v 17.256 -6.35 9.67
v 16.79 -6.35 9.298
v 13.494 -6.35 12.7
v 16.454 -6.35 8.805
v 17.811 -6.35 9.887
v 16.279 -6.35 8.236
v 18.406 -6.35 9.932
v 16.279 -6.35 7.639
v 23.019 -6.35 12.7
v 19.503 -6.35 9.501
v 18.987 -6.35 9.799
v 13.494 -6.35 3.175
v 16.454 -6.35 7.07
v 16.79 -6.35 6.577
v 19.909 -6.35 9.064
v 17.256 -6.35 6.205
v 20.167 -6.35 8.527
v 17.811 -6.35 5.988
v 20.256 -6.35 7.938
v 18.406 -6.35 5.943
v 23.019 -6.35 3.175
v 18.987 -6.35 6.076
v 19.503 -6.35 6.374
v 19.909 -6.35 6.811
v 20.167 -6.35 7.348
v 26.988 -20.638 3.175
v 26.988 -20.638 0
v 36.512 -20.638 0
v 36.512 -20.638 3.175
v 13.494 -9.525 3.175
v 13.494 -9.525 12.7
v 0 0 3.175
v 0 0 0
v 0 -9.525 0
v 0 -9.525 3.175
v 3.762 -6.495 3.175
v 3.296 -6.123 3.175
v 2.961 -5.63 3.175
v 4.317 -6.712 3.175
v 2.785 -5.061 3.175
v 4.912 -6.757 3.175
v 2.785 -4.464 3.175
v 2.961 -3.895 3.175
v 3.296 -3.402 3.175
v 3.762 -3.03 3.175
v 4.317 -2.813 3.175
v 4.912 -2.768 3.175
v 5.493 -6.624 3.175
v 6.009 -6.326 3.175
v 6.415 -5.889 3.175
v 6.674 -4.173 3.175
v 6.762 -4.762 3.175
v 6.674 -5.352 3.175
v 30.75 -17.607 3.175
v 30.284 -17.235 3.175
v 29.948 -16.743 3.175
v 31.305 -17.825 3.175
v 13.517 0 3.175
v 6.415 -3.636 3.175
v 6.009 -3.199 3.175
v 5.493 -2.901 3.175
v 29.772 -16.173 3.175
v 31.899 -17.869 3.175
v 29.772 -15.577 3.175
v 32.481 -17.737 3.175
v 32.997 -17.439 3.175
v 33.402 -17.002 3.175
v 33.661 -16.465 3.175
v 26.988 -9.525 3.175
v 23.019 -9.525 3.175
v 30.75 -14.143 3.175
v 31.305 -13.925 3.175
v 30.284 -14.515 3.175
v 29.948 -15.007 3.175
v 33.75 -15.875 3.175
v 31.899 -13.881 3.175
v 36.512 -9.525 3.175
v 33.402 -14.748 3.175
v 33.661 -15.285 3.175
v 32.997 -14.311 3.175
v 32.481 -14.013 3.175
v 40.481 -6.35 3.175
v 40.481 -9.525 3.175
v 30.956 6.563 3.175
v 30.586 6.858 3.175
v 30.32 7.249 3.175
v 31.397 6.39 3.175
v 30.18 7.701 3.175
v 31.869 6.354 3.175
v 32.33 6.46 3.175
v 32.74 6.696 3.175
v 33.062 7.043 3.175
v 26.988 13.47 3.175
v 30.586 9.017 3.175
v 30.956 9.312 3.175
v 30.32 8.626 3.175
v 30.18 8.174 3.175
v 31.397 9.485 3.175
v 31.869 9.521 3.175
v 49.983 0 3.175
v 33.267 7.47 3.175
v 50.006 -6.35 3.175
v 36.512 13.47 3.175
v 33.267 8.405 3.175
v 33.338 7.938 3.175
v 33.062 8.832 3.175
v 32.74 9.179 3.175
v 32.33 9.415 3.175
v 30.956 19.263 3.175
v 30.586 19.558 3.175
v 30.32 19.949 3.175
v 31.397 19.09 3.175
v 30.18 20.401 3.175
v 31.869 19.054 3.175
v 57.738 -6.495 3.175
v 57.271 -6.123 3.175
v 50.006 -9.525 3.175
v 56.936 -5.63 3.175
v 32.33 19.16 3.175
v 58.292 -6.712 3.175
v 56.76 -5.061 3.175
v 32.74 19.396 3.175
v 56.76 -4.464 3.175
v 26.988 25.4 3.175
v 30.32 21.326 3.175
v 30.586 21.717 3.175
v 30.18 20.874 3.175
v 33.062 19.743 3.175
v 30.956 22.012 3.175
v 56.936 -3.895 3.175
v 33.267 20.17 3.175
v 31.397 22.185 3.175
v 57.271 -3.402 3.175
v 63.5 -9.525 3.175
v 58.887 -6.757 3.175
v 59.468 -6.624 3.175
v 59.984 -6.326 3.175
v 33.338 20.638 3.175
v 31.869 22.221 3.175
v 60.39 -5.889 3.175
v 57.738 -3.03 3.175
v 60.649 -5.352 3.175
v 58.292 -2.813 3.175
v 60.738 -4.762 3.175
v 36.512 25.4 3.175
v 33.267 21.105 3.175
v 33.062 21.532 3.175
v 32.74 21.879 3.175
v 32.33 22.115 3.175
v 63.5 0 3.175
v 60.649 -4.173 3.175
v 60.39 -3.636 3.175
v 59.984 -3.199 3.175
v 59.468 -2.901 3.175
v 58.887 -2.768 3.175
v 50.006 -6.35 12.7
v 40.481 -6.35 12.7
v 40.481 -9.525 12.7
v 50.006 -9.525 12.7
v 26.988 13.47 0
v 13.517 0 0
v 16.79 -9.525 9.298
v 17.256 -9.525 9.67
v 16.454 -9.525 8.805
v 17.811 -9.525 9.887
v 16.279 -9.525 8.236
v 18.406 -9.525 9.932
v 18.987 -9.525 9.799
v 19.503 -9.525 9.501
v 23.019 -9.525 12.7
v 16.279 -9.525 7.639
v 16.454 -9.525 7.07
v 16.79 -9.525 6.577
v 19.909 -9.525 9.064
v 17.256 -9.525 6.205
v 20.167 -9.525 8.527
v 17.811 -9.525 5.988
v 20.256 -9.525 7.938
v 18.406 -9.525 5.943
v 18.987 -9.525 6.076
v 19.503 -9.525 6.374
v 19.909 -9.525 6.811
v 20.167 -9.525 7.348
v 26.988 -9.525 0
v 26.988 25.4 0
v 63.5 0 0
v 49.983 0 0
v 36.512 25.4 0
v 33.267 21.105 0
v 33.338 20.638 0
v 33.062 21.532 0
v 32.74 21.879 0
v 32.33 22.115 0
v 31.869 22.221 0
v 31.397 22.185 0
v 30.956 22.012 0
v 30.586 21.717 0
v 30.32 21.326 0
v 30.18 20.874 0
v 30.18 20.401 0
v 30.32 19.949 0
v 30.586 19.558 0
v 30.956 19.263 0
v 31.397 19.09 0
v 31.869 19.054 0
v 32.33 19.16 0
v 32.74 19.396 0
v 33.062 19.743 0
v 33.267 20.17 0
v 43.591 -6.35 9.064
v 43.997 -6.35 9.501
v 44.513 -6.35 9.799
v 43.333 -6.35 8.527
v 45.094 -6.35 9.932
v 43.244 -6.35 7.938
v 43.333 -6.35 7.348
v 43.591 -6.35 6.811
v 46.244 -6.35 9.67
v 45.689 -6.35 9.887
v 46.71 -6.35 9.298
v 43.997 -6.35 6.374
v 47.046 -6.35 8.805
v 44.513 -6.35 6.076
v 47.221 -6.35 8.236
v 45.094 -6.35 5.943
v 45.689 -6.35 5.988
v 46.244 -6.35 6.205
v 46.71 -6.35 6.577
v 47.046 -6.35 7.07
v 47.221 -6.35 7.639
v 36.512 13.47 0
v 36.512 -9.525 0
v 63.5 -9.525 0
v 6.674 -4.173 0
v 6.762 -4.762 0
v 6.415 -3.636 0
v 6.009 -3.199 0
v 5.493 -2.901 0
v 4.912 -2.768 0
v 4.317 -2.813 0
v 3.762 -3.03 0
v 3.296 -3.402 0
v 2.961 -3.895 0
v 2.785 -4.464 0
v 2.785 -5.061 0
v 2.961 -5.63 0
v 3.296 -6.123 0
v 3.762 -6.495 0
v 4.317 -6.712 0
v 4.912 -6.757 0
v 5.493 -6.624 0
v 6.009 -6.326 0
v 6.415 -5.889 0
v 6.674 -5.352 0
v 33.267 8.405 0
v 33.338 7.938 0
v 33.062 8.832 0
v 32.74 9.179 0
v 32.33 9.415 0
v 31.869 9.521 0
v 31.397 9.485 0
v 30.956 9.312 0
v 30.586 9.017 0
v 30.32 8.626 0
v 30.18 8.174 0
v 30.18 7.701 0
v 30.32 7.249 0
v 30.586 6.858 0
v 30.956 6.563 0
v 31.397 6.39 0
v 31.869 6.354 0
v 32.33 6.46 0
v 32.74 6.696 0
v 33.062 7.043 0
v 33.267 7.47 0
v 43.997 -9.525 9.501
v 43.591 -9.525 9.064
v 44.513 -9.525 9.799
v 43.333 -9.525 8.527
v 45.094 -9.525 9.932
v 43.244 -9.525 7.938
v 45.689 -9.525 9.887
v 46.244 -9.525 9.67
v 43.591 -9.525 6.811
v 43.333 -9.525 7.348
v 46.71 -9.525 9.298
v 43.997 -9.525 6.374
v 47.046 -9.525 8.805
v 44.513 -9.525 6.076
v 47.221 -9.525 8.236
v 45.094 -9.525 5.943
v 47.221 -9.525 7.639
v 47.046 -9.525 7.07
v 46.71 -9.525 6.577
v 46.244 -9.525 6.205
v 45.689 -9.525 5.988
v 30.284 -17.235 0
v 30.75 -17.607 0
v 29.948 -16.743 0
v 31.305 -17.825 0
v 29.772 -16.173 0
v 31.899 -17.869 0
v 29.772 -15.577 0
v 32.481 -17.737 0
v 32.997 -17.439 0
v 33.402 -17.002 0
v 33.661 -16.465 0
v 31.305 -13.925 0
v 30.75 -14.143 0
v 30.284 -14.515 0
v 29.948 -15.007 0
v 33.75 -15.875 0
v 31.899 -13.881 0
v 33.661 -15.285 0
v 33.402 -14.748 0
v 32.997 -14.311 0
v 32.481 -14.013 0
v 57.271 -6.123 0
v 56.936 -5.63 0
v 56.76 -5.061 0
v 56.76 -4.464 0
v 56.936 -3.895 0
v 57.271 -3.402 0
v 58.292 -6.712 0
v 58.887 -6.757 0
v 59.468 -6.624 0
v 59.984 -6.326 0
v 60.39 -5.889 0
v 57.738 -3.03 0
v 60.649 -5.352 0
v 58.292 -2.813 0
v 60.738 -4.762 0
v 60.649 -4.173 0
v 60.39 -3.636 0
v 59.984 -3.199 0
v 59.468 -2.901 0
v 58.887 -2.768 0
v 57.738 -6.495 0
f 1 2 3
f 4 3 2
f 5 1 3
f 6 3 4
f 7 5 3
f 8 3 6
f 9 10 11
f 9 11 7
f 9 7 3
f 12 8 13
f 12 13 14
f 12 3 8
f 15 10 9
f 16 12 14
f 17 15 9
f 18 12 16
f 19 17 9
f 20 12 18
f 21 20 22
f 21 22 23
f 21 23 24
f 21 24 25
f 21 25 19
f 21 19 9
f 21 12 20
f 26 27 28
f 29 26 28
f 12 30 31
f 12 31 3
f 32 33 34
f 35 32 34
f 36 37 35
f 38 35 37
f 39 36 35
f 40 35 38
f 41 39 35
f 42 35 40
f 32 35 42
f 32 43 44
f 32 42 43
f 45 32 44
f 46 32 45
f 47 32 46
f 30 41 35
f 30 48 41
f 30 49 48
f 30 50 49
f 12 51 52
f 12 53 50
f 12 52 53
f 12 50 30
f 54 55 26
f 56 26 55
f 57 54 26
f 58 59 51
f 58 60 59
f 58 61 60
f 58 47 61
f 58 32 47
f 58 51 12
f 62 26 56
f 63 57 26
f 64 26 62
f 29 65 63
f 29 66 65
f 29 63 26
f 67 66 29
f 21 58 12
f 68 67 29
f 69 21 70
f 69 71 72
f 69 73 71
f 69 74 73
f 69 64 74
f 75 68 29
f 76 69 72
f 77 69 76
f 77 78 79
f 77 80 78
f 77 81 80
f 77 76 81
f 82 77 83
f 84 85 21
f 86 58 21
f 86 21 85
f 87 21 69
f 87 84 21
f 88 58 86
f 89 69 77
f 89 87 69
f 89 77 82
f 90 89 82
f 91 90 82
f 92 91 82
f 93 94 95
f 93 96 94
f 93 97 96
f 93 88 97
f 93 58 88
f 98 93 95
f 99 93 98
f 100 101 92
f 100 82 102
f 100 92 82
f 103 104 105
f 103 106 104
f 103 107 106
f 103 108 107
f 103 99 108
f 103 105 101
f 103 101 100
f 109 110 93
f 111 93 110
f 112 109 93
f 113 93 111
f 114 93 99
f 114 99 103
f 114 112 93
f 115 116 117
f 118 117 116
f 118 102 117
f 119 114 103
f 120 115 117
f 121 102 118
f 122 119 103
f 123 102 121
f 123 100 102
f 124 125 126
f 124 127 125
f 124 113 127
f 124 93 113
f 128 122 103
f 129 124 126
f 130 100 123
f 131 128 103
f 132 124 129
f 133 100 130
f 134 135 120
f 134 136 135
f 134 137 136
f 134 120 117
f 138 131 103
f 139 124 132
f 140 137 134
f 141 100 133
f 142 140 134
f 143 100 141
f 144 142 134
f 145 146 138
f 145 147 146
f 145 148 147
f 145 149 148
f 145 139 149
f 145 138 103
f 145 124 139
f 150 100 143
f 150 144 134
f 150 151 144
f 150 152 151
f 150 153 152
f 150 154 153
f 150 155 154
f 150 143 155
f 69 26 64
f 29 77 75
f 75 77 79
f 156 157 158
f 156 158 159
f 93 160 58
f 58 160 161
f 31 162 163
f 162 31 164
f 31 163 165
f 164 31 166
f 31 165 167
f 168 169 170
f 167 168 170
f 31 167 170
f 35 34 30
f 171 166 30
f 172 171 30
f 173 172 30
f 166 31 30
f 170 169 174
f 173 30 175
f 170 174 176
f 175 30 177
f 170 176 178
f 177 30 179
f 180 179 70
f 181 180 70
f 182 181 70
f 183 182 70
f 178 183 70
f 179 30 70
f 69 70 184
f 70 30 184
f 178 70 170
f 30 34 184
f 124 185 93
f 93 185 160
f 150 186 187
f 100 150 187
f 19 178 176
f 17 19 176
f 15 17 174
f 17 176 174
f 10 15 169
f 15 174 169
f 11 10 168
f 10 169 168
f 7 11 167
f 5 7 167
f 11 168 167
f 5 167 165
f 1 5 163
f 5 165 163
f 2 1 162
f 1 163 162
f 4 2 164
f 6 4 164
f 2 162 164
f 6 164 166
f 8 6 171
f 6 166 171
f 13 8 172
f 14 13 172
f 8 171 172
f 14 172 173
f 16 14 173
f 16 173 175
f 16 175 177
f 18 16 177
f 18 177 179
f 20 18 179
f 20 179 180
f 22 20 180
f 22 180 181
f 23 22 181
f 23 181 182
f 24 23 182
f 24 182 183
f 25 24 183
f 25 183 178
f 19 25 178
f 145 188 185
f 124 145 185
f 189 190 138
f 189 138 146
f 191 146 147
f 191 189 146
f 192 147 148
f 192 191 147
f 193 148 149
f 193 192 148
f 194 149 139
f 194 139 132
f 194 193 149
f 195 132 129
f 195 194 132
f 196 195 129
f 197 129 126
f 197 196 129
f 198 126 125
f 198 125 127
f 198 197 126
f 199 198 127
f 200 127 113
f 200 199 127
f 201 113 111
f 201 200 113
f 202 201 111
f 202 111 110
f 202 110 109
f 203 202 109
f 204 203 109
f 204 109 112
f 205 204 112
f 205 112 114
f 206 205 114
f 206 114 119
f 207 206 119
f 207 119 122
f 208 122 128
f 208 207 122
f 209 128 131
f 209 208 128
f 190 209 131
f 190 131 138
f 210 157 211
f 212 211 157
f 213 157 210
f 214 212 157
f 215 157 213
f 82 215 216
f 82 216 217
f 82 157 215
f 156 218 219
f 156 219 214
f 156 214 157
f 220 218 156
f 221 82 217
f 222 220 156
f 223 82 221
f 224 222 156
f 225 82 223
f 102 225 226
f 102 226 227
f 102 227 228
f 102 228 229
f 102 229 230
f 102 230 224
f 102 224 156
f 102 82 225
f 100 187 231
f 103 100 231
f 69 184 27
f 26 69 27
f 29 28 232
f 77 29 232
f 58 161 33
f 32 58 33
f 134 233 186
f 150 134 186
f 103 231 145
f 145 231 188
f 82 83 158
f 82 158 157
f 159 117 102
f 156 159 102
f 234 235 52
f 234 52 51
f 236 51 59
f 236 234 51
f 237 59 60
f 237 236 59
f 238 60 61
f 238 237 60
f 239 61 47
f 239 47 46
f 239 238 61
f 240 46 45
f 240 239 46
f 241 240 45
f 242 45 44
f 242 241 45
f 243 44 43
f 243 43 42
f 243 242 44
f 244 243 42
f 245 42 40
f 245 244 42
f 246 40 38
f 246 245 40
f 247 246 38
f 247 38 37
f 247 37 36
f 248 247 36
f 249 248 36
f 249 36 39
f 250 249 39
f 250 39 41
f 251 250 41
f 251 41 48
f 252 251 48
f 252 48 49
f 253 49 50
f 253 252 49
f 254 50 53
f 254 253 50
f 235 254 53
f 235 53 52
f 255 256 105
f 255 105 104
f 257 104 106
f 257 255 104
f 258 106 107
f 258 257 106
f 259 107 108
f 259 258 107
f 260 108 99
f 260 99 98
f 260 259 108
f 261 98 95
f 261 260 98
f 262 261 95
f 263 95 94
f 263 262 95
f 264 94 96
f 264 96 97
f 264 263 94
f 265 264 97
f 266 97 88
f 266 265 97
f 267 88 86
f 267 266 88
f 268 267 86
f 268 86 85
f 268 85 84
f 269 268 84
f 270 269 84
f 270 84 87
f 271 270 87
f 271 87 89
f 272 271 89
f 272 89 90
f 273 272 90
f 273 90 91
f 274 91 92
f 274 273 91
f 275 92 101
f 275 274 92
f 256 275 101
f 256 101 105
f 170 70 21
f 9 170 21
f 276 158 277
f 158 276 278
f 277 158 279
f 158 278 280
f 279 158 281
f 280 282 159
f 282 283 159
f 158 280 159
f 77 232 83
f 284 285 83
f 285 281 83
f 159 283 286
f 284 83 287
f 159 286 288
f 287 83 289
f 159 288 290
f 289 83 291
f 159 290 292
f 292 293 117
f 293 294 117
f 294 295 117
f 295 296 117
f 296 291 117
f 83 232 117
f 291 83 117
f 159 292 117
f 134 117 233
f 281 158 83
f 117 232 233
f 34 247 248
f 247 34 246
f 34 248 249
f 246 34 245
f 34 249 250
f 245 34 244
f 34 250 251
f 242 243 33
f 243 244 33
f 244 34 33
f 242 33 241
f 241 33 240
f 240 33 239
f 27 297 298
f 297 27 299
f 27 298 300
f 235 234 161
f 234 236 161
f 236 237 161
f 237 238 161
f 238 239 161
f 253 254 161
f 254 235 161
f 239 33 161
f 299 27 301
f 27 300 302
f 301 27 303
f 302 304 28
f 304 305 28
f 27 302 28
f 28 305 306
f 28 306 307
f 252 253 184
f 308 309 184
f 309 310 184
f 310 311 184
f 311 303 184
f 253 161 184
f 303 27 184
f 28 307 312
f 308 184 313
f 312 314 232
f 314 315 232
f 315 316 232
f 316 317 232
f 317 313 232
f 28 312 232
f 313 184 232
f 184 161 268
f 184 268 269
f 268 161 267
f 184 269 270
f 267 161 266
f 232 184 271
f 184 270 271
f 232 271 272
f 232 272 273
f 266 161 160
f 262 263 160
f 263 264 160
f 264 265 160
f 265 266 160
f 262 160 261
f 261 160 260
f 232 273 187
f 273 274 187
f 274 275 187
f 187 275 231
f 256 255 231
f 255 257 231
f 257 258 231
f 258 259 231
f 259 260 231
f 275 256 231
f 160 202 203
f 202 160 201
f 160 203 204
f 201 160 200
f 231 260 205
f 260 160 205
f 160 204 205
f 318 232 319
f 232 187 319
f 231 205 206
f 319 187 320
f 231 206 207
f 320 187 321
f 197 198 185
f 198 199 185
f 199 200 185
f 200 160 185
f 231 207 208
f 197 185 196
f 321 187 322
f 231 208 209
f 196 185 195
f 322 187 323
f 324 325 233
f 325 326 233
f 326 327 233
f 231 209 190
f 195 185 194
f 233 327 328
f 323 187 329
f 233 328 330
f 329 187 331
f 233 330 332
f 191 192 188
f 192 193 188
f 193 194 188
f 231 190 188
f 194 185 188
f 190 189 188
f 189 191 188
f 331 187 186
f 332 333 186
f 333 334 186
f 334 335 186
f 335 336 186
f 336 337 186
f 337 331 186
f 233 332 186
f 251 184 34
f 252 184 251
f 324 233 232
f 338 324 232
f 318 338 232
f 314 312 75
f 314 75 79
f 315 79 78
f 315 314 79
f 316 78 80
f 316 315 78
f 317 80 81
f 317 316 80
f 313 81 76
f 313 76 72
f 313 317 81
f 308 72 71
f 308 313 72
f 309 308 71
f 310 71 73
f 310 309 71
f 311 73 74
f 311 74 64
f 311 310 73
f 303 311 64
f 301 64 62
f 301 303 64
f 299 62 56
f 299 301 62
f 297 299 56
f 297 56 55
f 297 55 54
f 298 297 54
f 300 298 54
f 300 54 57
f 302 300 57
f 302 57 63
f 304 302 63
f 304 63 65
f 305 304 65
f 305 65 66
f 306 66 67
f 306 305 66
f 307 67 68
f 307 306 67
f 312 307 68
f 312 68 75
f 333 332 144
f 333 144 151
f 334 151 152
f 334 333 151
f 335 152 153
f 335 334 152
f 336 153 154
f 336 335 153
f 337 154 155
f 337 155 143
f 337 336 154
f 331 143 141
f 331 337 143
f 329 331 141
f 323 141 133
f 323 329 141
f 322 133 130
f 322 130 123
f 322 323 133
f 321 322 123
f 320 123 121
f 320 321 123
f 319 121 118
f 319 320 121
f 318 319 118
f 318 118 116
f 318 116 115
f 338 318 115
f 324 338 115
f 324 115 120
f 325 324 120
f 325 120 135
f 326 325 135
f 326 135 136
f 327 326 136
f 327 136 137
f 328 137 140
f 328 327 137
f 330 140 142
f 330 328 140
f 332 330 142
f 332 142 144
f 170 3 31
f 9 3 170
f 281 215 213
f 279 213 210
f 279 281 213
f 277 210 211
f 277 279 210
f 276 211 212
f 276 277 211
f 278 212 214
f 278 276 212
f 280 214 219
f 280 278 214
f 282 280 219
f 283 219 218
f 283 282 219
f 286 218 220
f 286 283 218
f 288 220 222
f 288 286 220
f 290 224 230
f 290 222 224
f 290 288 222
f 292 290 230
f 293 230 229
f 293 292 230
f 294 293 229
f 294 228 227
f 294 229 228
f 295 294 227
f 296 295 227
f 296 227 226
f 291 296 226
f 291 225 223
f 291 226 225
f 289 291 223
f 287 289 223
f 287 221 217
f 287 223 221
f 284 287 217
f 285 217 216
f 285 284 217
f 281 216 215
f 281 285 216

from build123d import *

# Parameters (mm, degrees)
F0_R     = 2
F0_R_2   = 1.5875
F1_DEPTH = 3.175
F2_W     = 9.525
F2_H     = 3.175
F3_DEPTH = 9.525
F4_R     = 2
F5_DEPTH = 34.926


# Not quite as in the source:
# - a length typed as a fraction of an inch, garbled in the dataset ("3 / 203.2 mm" for 3/8 in), is restored
# - a pattern or mirror of a feature is missing from the dataset's text; its kind, count and spacing are read off the source's solid


with BuildPart() as f1:
    # F0 (on Top) → F1 (new body)
    with BuildSketch(Plane.XY):
        Polygon((13.5171158184, 0), (0, 0), (0, -9.525), (26.9875, -9.525), (26.9875, -20.6375), (36.5125, -20.6375), (36.5125, -9.525), (63.5, -9.525), (63.5, 0), (49.9828841816, 0), (36.5125, 13.4703841816), (36.5125, 25.4), (26.9875, 25.4), (26.9875, 13.4703841816), align=None)
        with Locations((4.7625, -4.7625)):
            Circle(F0_R, mode=Mode.SUBTRACT)
        with Locations((31.75, -15.875)):
            Circle(F0_R, mode=Mode.SUBTRACT)
        with Locations((58.7375, -4.7625)):
            Circle(F0_R, mode=Mode.SUBTRACT)
        with Locations((31.75, 7.9375)):
            Circle(F0_R_2, mode=Mode.SUBTRACT)
        with Locations((31.75, 20.6375)):
            Circle(F0_R_2, mode=Mode.SUBTRACT)
    extrude(amount=F1_DEPTH)

    # F2 (on face) → F3 (join)
    with BuildSketch(Plane.XY.offset(3.175)):
        with Locations((18.25625, -7.9375)):
            Rectangle(F2_W, F2_H)
        with Locations((45.24375, -7.9375)):
            Rectangle(F2_W, F2_H)
    extrude(amount=F3_DEPTH)

    # F4 (on face) → F5 (cut, through all)
    with BuildSketch(Plane.XZ.offset(9.525)):
        with Locations((18.25625, 7.9375)):
            Circle(F4_R)
    f5 = extrude(amount=-F5_DEPTH, mode=Mode.SUBTRACT)

    # F5_copies: F5 across plane
    add(f5.mirror(Plane(origin=(31.75, 0, 0), x_dir=(0, 0, 1), z_dir=(1, 0, 0))), mode=Mode.SUBTRACT)


solid = f1.part
